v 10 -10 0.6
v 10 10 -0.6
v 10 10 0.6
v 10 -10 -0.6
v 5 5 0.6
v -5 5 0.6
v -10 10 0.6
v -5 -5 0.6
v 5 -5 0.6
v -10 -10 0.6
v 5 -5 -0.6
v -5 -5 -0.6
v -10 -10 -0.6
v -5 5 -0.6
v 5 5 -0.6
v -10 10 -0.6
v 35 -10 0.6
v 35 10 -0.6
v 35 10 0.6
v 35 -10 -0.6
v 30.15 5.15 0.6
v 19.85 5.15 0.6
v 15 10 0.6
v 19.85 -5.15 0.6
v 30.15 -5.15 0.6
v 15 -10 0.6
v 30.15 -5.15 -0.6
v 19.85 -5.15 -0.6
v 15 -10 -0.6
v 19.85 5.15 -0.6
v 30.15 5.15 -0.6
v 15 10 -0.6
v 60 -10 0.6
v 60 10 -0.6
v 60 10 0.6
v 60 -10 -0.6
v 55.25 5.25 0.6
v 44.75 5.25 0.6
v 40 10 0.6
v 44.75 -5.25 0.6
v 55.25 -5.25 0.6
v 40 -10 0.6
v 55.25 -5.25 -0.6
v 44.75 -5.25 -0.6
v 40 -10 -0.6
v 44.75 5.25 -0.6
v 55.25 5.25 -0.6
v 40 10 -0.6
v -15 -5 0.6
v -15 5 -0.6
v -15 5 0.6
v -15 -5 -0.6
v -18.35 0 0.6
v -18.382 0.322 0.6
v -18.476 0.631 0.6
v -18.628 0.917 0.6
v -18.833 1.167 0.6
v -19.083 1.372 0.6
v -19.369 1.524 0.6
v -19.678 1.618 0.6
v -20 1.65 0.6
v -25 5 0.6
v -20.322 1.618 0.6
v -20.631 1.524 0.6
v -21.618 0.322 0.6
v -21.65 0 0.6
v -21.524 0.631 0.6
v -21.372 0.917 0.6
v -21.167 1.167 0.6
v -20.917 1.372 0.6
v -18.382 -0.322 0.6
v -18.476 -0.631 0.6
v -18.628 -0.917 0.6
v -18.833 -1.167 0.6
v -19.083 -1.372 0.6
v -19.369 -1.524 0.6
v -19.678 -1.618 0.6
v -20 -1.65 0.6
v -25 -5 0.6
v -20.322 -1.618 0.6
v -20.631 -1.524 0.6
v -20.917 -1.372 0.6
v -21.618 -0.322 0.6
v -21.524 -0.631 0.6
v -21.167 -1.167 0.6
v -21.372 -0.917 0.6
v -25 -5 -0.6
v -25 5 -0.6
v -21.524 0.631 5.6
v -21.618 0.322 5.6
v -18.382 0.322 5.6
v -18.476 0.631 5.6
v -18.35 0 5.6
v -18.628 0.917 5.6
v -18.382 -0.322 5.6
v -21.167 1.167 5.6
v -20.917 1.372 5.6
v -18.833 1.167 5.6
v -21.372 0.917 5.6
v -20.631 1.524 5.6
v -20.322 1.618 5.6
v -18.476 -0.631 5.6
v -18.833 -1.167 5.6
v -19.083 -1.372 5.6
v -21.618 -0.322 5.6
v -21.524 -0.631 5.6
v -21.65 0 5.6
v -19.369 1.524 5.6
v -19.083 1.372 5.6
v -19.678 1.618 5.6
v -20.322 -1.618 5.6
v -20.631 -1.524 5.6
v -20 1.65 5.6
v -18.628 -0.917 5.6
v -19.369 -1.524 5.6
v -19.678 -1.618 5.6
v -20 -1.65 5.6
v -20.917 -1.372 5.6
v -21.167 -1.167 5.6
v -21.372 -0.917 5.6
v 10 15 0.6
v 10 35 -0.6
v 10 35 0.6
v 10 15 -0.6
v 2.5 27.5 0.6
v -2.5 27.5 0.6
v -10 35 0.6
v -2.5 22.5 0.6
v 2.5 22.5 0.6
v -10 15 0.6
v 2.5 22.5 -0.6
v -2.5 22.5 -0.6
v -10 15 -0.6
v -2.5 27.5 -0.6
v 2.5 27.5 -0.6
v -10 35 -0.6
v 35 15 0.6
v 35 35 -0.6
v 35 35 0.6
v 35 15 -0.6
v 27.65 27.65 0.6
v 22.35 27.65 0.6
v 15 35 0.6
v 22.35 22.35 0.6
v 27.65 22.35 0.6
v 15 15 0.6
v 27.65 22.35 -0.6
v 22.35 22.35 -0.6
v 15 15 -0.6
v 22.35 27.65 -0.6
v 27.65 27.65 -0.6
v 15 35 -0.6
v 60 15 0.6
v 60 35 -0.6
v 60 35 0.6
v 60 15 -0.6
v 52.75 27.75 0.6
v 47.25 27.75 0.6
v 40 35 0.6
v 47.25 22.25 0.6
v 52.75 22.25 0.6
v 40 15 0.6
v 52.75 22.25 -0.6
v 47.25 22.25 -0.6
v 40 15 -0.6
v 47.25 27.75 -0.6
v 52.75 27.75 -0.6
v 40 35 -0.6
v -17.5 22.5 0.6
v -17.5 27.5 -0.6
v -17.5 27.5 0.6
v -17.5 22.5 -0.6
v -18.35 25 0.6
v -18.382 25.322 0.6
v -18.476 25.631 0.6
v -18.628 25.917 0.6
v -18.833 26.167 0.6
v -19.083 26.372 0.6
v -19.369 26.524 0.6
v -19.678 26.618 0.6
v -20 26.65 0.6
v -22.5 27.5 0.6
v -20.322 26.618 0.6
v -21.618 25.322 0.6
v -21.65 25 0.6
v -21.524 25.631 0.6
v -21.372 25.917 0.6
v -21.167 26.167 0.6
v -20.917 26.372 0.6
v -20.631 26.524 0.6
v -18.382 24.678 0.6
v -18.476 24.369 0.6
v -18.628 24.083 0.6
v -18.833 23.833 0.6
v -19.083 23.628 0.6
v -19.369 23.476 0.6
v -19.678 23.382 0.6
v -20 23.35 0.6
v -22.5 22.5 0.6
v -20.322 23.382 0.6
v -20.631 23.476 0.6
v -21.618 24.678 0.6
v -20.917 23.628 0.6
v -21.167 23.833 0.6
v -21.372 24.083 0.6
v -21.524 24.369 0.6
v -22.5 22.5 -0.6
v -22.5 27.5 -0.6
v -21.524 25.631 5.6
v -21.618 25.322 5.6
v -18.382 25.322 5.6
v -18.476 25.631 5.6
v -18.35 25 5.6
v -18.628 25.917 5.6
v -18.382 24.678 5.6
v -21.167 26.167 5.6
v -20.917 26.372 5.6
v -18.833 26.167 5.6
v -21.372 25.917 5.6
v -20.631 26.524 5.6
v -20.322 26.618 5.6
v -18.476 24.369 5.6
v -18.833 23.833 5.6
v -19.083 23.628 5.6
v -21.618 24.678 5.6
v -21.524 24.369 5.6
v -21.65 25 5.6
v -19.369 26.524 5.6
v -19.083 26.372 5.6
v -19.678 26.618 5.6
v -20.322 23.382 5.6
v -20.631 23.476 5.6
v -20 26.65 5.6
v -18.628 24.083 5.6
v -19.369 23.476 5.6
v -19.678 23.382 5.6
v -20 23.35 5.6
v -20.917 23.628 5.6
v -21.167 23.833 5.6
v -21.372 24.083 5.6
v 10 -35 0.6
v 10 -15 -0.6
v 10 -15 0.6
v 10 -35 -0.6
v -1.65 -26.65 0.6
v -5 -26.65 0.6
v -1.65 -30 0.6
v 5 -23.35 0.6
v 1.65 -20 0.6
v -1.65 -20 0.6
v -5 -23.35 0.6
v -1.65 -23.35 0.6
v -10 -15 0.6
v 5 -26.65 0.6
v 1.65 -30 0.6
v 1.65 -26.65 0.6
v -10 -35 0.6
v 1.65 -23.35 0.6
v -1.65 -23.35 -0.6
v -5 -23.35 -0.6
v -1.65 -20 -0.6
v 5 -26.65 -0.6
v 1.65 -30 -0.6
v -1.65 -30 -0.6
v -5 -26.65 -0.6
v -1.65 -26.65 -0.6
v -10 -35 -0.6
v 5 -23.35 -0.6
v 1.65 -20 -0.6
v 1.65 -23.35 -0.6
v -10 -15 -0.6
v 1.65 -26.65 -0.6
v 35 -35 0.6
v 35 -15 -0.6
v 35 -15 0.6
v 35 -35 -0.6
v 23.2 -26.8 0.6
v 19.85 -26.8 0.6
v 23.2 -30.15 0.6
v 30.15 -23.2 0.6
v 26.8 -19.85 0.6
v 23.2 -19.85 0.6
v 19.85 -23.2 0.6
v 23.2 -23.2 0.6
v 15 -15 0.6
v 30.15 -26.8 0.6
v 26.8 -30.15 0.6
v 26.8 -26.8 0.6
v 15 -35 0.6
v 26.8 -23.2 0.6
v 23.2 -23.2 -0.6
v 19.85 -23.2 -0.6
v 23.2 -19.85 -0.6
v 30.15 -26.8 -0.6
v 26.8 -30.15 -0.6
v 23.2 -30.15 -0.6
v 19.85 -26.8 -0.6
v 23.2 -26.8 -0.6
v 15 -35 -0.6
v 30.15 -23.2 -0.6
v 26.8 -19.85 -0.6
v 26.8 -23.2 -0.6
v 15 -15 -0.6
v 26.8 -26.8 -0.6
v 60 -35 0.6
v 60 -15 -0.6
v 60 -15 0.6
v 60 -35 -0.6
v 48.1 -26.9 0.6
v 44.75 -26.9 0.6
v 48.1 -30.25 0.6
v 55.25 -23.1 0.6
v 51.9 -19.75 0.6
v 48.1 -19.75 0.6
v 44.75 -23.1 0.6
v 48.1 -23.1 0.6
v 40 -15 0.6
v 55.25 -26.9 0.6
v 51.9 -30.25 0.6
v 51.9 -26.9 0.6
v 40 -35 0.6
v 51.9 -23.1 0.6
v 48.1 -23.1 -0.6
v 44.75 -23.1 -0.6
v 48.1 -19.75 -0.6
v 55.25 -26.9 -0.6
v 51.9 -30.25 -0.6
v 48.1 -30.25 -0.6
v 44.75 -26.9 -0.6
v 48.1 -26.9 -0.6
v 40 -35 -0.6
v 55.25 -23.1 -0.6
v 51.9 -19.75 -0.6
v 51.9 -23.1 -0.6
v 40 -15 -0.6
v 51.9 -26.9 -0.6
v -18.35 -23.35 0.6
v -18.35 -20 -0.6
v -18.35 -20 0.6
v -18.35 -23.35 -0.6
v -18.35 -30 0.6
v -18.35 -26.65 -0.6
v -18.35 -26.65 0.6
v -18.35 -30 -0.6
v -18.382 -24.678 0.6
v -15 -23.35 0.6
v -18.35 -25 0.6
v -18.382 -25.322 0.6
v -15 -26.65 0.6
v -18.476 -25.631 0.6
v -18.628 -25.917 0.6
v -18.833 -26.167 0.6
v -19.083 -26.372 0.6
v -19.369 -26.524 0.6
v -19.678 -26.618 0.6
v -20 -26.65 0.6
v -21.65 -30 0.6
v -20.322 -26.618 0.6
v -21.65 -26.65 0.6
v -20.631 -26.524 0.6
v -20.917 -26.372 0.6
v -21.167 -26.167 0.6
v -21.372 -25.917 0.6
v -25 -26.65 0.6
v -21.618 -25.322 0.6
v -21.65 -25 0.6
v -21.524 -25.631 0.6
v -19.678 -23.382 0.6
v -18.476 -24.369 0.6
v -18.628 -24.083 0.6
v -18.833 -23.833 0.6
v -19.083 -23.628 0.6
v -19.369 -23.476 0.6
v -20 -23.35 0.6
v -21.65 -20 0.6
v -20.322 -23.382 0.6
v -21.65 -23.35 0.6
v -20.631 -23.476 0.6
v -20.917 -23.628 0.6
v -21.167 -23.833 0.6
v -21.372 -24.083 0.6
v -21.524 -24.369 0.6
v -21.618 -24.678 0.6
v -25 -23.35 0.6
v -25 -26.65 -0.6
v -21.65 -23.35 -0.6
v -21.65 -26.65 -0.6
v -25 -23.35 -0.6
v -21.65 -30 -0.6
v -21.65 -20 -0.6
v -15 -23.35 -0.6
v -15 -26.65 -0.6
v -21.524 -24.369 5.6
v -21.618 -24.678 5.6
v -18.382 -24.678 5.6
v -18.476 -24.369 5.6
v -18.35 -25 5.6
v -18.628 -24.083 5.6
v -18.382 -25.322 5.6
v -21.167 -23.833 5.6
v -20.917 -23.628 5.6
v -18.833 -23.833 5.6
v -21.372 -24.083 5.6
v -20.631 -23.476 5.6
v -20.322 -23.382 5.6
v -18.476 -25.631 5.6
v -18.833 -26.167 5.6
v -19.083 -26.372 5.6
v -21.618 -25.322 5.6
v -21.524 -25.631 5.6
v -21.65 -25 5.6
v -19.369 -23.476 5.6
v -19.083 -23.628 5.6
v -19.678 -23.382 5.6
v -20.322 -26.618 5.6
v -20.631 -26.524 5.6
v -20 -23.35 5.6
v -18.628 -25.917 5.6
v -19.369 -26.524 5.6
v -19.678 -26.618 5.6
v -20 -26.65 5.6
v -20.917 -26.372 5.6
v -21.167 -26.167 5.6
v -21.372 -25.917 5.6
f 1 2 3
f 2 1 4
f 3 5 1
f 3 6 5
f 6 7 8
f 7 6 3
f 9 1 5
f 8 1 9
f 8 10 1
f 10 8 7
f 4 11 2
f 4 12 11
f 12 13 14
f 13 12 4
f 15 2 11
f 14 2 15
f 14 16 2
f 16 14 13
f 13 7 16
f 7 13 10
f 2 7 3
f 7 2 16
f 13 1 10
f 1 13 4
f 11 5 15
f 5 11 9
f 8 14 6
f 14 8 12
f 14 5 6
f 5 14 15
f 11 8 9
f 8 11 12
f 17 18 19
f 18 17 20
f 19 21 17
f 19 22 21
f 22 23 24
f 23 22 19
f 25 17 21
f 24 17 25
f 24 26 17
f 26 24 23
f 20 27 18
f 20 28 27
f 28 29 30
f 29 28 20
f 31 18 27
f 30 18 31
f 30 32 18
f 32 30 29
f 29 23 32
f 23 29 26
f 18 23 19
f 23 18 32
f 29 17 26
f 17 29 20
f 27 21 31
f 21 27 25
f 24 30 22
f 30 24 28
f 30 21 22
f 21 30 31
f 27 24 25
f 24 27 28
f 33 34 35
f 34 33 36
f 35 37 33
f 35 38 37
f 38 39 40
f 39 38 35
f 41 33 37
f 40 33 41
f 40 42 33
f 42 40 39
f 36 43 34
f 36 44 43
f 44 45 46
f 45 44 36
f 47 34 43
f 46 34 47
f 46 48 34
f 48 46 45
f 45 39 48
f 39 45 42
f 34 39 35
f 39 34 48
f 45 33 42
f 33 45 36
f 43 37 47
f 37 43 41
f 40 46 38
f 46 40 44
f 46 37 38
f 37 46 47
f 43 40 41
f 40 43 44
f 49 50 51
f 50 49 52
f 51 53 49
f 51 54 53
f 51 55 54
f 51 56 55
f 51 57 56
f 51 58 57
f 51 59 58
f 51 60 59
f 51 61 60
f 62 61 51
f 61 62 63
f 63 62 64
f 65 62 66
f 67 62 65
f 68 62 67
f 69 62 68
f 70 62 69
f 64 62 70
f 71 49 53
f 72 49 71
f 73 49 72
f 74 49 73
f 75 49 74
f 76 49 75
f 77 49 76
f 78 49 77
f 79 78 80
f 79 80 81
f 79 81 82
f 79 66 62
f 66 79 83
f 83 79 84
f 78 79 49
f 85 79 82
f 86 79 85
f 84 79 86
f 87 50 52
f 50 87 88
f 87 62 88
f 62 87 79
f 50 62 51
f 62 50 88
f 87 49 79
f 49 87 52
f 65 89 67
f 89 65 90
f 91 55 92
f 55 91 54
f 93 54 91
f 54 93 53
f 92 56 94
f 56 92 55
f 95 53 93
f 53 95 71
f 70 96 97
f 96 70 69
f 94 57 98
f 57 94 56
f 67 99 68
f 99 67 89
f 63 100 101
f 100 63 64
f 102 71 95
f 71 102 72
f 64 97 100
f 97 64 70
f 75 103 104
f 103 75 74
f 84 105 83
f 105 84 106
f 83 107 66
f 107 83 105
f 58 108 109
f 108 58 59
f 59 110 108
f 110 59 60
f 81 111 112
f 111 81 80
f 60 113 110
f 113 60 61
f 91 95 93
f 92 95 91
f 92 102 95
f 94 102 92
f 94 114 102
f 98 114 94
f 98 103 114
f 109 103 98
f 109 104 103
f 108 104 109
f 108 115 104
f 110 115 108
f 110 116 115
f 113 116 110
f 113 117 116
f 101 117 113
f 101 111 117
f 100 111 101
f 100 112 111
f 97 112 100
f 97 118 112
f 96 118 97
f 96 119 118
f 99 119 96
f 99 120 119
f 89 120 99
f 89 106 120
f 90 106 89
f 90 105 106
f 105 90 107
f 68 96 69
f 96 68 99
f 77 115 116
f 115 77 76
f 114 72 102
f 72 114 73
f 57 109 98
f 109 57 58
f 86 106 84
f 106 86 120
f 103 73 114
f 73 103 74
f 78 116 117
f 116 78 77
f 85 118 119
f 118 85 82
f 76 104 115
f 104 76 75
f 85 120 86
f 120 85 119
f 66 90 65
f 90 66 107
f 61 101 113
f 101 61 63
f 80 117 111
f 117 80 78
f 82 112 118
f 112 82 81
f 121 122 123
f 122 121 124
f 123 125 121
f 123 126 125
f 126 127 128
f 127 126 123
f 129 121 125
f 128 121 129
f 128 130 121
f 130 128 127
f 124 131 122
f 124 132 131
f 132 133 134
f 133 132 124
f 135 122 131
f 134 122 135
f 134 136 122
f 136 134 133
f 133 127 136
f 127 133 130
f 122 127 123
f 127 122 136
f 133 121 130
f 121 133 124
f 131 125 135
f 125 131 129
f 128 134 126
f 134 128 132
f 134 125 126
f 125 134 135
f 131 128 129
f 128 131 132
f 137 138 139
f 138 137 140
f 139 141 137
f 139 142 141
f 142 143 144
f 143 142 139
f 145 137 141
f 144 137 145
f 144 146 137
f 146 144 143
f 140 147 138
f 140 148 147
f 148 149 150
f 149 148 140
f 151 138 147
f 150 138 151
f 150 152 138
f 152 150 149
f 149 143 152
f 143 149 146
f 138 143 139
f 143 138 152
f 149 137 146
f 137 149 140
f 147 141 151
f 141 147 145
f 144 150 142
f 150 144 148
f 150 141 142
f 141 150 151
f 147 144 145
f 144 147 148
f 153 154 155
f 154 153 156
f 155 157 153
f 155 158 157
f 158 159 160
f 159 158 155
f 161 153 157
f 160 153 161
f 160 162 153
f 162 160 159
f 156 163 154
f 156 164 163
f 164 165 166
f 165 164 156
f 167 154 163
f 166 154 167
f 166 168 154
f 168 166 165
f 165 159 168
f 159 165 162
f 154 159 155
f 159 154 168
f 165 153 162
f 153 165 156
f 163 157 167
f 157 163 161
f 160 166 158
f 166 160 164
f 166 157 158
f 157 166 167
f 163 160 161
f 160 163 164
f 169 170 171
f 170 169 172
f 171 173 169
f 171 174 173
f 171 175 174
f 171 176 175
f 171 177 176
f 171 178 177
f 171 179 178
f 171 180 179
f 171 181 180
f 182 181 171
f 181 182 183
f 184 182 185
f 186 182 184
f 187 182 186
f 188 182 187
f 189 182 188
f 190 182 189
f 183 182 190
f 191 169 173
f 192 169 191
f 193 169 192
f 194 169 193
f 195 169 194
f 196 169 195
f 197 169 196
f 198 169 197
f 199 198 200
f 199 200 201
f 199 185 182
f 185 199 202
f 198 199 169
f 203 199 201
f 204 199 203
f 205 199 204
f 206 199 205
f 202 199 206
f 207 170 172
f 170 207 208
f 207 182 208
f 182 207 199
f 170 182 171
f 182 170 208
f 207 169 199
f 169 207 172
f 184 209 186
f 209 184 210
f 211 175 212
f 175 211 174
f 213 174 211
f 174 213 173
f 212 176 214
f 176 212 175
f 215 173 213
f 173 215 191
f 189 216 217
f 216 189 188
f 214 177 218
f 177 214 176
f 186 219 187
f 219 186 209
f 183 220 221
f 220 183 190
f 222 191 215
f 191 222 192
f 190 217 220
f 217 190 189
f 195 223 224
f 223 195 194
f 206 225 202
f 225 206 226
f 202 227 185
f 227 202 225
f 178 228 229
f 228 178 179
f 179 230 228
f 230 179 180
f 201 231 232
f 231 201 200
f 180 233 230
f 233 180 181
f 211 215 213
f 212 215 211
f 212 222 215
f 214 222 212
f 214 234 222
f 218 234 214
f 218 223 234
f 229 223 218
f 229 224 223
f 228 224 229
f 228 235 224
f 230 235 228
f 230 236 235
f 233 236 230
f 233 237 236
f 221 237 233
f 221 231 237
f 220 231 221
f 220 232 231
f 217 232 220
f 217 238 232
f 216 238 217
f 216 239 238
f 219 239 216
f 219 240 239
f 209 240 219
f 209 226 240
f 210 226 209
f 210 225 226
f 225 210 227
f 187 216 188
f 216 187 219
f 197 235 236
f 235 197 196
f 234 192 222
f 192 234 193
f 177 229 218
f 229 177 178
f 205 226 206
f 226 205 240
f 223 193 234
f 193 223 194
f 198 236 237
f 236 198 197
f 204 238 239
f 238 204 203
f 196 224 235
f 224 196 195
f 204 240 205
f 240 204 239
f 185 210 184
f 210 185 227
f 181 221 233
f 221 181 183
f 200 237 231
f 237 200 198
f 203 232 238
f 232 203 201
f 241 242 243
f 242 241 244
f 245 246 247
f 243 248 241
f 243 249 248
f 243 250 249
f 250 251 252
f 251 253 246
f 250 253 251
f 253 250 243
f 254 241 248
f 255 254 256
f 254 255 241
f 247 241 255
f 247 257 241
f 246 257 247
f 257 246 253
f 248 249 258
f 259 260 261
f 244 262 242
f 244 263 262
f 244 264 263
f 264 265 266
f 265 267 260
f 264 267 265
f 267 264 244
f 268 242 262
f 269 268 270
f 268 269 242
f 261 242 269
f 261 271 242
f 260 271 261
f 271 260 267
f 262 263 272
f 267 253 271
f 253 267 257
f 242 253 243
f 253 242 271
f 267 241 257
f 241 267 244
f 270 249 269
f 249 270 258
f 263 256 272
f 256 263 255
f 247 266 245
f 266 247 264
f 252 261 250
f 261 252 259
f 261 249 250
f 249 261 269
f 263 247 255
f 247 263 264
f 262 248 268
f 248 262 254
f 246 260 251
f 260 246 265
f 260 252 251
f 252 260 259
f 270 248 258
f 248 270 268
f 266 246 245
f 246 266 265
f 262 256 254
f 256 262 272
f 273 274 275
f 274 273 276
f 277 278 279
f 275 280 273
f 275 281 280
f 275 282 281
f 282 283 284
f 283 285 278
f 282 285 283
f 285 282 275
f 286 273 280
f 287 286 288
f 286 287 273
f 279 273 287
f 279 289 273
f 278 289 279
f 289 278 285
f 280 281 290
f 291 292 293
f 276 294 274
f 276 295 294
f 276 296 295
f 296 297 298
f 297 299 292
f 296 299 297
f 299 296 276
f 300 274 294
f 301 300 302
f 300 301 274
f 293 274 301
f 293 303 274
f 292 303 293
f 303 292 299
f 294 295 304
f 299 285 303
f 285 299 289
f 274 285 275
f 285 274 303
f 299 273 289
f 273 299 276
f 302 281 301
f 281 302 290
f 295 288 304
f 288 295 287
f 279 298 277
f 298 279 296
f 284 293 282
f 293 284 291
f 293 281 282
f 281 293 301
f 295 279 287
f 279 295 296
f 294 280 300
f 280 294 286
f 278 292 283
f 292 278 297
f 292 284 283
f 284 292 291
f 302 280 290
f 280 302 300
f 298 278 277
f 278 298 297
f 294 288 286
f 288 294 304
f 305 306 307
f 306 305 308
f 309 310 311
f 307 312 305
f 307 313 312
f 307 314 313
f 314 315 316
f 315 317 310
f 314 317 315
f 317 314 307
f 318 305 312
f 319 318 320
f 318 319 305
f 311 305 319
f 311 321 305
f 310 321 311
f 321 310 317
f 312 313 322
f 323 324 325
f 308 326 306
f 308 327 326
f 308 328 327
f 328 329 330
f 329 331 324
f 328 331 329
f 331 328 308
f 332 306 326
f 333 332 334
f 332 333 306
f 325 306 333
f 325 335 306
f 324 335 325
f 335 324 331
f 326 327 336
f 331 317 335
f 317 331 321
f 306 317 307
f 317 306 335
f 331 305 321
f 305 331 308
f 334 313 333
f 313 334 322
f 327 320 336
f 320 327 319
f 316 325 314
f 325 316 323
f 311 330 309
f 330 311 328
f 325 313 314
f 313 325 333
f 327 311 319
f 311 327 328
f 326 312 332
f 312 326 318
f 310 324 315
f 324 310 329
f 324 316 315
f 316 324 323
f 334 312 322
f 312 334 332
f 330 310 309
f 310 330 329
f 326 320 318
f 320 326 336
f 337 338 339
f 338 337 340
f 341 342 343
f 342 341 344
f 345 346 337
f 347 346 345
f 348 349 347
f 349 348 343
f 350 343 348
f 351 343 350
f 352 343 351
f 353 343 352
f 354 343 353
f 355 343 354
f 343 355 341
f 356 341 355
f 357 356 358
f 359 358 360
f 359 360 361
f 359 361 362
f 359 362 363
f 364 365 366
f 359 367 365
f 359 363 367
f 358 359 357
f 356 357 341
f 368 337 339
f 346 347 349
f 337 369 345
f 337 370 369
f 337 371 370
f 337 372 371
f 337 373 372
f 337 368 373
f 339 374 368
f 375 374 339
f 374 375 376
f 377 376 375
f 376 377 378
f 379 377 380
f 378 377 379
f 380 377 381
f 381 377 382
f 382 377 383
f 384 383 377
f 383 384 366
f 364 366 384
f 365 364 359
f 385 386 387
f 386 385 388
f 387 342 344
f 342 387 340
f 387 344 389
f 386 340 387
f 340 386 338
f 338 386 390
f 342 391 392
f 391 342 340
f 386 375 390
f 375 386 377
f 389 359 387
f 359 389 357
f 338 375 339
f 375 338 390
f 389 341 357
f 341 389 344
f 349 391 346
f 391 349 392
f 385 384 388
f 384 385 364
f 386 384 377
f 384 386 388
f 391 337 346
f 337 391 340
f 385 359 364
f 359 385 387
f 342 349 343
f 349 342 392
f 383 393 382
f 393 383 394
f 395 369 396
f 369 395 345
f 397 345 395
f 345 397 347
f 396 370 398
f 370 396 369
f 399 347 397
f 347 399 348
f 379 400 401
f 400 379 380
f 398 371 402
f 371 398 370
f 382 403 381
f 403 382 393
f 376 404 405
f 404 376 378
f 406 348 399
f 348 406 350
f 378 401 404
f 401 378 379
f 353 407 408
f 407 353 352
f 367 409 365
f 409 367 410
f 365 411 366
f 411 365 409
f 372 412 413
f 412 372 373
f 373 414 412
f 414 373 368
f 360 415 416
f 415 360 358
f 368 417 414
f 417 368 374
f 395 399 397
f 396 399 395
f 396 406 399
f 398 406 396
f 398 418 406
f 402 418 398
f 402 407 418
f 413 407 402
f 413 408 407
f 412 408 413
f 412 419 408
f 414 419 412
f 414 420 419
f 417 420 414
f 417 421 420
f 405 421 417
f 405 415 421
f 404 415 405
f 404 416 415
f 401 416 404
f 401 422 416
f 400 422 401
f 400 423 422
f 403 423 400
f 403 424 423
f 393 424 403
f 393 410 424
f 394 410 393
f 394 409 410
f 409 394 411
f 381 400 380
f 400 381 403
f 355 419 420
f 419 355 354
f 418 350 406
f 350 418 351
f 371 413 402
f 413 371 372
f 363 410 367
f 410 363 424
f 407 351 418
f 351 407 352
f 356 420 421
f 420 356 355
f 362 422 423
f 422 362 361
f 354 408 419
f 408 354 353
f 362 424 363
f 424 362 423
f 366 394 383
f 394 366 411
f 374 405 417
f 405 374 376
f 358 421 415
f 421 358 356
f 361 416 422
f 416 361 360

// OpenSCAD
$fn=32;

difference() {
  cube([20, 20, 1.2], center=true);
  cube([10, 10, 5], center=true);
}

translate([25, 0, 0]) difference() {
  cube([20, 20, 1.2], center=true);
  cube([10+.3, 10+.3, 5], center=true);
}

translate([50, 0, 0]) difference() {
  cube([20, 20, 1.2], center=true);
  cube([10+.5, 10+.5, 5], center=true);
}

translate([-20, 0, 0]) {
  cube([10, 10, 1.2], center=true);
  translate([0, 0, -0.6]) cylinder(r=3.3/2, h=1.2+5);
}


translate([0, 25, 0]) {
difference() {
  cube([20, 20, 1.2], center=true);
  cube([5, 5, 5], center=true);
}

translate([25, 0, 0]) difference() {
  cube([20, 20, 1.2], center=true);
  cube([5+.3, 5+.3, 5], center=true);
}

translate([50, 0, 0]) difference() {
  cube([20, 20, 1.2], center=true);
  cube([5+.5, 5+.5, 5], center=true);
}

translate([-20, 0, 0]) {
  cube([5, 5, 1.2], center=true);
  translate([0, 0, -0.6]) cylinder(r=3.3/2, h=1.2+5);
}
}


translate([0, -25, 0]) {

difference() {
  cube([20, 20, 1.2], center=true);
  cube([3.3, 10, 5], center=true);
  cube([10, 3.3, 5], center=true);
}

translate([25, 0, 0]) difference() {
  cube([20, 20, 1.2], center=true);
  cube([3.3+.3, 10+.3, 5], center=true);
  cube([10+.3, 3.3+.3, 5], center=true);
}

translate([50, 0, 0]) difference() {
  cube([20, 20, 1.2], center=true);
  cube([3.3+.5, 10+.5, 5], center=true);
  cube([10+.5, 3.3+.5, 5], center=true);
}

translate([-20, 0, 0]) {
  cube([3.3, 10, 1.2], center=true);
  cube([10, 3.3, 1.2], center=true);
  translate([0, 0, -0.6]) cylinder(r=3.3/2, h=1.2+5);
}
}
